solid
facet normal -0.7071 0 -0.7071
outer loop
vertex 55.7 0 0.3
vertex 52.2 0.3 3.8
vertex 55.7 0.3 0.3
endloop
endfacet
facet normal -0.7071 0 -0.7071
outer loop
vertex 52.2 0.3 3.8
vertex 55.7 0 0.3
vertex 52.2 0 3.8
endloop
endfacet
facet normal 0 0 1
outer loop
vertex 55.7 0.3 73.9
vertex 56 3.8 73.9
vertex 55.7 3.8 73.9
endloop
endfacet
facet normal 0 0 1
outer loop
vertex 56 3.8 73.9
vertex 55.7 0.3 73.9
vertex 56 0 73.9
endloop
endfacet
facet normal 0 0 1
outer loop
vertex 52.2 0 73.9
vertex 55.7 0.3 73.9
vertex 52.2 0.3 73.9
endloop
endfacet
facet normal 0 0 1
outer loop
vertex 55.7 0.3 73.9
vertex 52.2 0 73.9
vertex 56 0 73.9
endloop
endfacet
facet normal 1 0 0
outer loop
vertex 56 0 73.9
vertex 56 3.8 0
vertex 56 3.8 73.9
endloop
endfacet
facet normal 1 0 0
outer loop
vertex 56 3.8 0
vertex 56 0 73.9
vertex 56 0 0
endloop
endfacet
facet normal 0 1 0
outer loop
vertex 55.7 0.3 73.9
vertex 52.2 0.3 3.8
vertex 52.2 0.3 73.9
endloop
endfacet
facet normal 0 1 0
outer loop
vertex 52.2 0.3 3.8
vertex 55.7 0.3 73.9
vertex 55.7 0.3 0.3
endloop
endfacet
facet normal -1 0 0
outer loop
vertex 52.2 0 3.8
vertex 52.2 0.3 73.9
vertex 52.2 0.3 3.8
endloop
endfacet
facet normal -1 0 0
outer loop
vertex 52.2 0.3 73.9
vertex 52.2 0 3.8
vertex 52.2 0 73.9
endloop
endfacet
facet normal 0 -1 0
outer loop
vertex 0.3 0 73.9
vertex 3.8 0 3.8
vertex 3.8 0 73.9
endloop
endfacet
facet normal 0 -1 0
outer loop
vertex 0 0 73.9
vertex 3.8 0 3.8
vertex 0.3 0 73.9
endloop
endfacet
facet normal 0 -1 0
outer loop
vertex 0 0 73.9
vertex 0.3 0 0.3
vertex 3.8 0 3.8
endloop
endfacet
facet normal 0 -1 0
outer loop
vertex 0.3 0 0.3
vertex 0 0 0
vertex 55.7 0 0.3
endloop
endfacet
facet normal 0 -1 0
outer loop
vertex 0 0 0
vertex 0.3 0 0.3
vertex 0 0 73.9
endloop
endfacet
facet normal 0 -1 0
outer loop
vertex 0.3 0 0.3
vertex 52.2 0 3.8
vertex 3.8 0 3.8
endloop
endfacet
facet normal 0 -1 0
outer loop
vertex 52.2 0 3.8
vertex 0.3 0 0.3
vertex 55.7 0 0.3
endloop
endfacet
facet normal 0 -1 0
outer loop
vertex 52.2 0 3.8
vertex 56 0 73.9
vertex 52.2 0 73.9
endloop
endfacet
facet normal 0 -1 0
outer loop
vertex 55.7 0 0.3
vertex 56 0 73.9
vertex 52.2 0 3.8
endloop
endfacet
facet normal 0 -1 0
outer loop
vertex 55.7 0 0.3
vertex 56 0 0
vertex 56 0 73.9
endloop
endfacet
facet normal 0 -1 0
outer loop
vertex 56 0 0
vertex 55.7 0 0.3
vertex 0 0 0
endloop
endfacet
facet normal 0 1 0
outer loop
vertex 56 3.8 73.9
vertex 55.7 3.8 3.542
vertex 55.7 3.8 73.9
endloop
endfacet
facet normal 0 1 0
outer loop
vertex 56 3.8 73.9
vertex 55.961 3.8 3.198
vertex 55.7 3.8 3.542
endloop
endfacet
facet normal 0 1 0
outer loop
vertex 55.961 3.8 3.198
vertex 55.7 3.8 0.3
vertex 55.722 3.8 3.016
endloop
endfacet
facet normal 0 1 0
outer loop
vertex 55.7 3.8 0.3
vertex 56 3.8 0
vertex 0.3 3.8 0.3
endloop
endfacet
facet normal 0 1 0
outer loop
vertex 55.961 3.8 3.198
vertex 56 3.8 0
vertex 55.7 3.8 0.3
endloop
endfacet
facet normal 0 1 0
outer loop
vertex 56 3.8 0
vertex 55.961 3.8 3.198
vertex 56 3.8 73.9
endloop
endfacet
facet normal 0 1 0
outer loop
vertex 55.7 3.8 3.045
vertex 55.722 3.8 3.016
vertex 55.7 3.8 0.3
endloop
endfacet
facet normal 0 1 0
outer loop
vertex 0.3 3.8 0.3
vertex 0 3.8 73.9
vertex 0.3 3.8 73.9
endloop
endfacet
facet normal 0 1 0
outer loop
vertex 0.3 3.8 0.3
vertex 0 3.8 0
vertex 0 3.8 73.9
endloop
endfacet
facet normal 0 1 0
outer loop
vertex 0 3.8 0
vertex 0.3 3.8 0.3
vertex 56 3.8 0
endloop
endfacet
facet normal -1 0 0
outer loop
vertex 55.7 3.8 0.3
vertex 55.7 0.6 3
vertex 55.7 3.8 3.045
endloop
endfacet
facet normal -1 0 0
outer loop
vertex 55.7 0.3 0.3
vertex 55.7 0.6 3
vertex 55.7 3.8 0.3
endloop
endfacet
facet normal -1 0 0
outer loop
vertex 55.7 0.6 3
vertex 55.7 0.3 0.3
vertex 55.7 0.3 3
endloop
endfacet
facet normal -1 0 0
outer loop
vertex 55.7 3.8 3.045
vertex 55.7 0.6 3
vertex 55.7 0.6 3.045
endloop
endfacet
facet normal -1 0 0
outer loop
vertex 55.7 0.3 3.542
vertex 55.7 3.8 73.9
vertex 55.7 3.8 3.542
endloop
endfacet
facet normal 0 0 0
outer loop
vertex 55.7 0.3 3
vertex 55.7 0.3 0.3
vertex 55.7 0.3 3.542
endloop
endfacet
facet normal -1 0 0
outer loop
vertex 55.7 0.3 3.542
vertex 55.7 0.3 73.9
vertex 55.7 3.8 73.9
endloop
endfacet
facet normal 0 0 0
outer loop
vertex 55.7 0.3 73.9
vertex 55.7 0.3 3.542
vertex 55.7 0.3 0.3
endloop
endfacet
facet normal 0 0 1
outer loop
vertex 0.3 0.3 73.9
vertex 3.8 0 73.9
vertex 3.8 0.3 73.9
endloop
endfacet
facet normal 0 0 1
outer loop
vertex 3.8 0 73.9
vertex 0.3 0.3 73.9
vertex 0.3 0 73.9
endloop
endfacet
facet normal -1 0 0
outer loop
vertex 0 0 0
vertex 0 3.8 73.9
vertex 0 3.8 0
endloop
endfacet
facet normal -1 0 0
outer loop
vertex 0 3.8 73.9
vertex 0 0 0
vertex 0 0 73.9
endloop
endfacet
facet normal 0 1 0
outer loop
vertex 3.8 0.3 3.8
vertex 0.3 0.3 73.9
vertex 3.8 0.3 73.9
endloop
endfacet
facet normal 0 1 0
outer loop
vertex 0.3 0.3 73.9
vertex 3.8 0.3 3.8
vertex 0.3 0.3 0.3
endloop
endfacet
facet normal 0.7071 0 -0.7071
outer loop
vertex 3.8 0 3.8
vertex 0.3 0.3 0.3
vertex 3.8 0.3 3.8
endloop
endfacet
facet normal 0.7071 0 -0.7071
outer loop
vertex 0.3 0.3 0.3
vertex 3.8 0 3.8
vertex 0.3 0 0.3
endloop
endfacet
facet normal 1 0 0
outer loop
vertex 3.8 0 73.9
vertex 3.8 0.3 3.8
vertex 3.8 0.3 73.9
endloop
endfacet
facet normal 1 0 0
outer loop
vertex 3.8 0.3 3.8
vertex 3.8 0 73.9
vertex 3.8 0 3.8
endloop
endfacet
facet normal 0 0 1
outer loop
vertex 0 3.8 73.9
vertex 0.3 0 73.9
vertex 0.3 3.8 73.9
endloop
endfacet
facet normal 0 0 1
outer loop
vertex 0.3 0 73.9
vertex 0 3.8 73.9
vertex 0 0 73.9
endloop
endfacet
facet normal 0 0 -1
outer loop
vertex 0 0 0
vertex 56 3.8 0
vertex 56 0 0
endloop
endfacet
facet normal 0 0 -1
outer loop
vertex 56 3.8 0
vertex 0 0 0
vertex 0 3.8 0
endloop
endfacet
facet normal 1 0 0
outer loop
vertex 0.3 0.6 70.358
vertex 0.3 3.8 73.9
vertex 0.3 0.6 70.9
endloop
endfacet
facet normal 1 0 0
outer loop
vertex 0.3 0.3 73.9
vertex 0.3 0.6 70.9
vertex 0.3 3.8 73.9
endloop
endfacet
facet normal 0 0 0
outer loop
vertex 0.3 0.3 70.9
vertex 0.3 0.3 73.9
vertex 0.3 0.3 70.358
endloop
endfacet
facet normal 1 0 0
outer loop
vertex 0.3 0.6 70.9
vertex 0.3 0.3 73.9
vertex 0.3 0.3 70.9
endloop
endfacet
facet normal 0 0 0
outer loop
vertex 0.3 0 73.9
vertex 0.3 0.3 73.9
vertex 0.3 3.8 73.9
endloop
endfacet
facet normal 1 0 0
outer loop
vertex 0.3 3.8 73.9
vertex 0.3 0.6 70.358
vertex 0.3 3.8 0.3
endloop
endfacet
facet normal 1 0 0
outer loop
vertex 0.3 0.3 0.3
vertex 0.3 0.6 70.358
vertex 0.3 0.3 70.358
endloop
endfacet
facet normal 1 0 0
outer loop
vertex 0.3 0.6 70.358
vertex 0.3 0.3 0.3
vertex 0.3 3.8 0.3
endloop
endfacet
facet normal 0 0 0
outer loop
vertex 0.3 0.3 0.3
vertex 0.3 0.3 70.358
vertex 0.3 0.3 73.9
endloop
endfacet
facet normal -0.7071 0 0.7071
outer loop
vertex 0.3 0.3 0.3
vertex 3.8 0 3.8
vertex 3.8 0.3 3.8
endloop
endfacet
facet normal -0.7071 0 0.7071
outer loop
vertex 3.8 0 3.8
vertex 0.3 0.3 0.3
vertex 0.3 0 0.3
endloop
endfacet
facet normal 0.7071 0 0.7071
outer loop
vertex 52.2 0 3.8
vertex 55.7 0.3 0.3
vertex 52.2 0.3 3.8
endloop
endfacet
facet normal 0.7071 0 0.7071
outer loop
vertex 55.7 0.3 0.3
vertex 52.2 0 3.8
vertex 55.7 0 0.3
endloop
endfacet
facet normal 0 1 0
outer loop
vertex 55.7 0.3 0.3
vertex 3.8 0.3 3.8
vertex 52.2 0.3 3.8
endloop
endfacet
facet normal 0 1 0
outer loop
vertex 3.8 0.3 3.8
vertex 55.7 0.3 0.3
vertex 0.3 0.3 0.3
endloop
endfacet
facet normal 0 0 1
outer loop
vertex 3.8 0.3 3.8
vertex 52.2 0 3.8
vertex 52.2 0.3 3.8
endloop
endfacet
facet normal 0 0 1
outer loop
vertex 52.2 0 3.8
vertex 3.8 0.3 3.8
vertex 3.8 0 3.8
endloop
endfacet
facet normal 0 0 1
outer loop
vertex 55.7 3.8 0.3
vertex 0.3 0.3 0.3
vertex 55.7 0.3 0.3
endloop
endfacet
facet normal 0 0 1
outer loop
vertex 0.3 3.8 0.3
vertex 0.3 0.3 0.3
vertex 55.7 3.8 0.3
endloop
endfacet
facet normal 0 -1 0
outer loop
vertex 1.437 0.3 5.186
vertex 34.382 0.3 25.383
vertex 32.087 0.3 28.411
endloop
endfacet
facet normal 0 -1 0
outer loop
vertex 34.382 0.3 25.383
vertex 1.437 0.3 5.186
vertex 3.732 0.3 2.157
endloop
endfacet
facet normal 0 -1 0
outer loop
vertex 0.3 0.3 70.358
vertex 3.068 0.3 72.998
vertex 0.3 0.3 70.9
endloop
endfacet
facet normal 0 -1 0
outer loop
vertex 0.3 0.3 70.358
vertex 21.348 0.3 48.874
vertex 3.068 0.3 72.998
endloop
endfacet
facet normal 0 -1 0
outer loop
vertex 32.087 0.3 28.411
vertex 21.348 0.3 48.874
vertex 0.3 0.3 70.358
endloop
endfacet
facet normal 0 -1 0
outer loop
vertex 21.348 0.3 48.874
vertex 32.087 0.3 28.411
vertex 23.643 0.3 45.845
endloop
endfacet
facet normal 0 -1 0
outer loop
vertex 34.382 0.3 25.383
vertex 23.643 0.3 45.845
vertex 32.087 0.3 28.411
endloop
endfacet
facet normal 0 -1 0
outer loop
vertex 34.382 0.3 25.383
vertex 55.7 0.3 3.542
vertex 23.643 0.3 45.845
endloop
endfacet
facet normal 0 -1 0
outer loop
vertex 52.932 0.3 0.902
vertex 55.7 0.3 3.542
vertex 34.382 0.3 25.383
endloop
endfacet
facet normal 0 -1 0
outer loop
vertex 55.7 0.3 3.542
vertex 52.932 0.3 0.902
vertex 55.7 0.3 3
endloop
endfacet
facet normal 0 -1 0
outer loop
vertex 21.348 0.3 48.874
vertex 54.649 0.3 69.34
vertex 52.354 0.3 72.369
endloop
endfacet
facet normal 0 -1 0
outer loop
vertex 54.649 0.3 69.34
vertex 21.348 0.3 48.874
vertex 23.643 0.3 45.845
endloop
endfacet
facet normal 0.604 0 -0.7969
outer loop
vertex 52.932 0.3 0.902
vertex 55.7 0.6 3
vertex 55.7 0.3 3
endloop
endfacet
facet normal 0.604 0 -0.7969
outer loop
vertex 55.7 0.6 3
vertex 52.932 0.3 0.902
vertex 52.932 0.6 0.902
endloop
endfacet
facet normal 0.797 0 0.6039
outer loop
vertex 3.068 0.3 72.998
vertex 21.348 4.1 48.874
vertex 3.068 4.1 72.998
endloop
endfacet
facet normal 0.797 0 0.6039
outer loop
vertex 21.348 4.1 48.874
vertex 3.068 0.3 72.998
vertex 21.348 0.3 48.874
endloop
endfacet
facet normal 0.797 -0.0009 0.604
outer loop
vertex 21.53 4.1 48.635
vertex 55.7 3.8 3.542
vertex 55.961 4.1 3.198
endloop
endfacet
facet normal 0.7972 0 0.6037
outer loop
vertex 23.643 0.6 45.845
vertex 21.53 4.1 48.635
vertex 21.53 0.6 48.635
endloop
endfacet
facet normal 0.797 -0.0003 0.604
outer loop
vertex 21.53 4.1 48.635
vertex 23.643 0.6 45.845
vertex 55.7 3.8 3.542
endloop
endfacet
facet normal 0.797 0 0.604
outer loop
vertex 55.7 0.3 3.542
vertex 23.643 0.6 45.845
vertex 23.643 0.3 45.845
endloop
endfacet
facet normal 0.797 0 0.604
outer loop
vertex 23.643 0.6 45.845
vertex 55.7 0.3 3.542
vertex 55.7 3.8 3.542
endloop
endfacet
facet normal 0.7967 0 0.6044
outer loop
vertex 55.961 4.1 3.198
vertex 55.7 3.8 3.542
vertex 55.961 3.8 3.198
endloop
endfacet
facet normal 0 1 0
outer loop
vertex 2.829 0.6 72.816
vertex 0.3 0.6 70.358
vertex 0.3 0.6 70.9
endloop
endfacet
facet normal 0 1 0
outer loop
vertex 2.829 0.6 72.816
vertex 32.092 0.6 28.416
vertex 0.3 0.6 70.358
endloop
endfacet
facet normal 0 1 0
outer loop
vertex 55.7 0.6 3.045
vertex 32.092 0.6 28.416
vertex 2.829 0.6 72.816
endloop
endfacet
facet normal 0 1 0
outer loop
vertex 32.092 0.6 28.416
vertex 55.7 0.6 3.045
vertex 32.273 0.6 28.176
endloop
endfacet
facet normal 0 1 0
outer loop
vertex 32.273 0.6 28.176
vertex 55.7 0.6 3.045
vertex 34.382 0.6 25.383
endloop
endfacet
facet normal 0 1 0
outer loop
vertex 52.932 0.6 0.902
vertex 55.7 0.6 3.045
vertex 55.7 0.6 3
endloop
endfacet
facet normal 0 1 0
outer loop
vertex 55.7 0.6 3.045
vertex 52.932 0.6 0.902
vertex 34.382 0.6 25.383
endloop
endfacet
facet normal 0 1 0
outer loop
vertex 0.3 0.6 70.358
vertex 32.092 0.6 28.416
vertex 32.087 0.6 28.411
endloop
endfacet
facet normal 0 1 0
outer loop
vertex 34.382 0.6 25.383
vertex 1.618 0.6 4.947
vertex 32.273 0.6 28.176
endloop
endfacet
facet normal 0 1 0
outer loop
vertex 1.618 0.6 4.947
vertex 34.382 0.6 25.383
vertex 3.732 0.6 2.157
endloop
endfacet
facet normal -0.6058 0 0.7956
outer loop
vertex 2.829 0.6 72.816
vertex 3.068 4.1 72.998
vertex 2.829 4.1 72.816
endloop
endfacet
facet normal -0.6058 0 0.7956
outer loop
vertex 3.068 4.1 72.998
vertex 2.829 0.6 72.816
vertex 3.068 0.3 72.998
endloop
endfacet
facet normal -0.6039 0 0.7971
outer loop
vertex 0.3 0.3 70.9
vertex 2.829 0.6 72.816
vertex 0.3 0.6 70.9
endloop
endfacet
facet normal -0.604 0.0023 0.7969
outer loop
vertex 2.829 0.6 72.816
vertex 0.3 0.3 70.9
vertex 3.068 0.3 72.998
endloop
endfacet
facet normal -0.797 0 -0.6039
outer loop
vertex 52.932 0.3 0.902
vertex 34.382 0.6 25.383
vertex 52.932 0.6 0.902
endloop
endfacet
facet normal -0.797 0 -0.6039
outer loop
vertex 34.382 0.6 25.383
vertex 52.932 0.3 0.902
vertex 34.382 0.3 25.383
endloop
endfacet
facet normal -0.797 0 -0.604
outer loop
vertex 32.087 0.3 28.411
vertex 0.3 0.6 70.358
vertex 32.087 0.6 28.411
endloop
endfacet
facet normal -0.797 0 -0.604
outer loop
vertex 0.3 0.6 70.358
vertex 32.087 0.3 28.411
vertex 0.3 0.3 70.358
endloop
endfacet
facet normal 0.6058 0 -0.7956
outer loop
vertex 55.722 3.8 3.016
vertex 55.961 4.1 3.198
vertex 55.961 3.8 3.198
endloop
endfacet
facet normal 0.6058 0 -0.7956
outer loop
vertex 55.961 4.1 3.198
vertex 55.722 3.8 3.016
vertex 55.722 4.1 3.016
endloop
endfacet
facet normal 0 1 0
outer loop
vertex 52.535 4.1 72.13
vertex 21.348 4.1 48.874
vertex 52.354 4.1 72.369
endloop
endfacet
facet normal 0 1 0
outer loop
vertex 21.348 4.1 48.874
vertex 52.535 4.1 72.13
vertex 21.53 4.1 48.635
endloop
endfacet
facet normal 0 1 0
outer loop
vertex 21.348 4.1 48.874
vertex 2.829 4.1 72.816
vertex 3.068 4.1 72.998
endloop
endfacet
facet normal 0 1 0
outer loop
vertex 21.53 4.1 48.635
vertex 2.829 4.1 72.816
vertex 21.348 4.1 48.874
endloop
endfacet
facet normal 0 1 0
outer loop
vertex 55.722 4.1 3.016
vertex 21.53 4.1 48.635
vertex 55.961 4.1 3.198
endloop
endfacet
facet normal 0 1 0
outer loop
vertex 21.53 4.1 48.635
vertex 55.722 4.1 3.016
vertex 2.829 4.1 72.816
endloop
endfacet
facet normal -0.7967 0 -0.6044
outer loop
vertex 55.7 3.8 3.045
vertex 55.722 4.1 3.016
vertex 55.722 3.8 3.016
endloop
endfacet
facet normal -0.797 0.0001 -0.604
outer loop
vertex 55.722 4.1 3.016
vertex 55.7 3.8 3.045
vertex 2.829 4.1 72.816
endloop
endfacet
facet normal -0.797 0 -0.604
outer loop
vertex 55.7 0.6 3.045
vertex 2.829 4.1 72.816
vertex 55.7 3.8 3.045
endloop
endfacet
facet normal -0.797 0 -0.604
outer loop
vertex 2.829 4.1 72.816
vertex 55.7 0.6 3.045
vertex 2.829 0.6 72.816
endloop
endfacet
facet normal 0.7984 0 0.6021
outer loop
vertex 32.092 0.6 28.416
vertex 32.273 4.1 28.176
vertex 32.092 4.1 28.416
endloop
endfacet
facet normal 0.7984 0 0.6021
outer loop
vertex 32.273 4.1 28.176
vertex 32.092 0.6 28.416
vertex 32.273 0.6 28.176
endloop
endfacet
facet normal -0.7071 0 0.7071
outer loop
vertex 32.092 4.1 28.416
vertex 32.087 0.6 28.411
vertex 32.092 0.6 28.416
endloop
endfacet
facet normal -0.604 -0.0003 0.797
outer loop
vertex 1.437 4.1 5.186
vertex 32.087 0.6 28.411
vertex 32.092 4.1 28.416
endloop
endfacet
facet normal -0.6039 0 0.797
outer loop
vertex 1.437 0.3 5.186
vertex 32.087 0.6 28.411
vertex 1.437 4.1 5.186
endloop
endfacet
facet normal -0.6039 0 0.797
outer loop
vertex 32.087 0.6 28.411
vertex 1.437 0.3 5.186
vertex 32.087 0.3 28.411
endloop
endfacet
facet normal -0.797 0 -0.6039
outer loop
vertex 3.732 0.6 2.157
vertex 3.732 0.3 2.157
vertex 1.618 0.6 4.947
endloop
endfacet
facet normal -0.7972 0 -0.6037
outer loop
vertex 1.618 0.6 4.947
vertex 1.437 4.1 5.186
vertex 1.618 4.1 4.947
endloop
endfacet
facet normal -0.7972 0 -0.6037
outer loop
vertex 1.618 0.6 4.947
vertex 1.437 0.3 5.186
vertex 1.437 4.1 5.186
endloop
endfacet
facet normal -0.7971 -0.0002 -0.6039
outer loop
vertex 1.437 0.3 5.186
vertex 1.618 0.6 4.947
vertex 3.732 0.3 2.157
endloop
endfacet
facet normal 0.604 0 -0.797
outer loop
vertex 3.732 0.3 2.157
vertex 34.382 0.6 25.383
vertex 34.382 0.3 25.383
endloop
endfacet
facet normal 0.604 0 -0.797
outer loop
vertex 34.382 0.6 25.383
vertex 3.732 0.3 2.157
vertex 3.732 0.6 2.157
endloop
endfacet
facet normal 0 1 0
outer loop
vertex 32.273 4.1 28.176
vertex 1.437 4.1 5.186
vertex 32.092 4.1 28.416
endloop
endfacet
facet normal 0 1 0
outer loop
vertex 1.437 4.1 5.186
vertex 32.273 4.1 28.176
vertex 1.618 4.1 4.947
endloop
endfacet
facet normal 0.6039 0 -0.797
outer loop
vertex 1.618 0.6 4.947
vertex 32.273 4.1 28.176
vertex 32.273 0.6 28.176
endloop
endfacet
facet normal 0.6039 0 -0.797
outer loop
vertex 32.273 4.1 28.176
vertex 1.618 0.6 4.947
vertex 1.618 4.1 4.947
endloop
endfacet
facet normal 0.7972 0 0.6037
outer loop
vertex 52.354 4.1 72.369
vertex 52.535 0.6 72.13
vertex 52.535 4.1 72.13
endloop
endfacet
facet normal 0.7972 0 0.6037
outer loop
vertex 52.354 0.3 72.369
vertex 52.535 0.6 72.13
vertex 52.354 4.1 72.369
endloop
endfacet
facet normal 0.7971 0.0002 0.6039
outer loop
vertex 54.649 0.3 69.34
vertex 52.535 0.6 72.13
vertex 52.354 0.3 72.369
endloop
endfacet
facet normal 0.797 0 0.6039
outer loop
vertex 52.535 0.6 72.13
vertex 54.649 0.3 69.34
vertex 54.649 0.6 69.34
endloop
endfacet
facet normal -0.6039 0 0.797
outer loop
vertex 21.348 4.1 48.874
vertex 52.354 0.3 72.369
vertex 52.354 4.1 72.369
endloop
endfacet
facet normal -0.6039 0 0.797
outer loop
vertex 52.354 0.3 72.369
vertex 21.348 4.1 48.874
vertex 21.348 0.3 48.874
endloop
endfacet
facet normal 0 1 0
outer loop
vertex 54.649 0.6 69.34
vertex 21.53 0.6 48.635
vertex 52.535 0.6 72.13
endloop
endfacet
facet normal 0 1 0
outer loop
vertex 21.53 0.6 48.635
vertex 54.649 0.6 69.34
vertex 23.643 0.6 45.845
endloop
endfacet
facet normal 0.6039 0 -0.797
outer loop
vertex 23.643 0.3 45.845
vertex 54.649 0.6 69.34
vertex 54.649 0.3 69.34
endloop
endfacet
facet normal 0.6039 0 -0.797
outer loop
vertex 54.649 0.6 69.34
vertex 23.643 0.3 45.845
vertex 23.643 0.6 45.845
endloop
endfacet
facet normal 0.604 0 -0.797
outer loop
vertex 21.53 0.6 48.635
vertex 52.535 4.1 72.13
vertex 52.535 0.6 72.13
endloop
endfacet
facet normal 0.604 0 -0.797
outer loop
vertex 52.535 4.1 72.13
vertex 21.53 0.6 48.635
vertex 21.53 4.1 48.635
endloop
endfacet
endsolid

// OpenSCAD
// use <hdim.scad> 


bar_t  = 0.3;

module tableleg(height = 73.9, width = 56, bar_diam = 3.8, dimensions=true, explode=false)
{
    d = explode ? 20 : 0;
    c1 = [0.5,0.28,0.19, 1.0];
    c2 = [0.8,0.30,0.29, 1.0];
    
    translate([width,0,0])
    rotate([0,90,90])
    {
    translate([-height,-d,0]) 
    tl_anglebar(height, bar_diam, c1, straight1=true);
    translate([0,width+d,0]) 
    rotate([0,0,180])
    tl_anglebar(height, bar_diam, c1, straight2=true);
    translate([d,0,0]) 
    rotate([0,0,90])
    tl_anglebar(width, bar_diam, c2);
    angle = atan2(width, height);
    len = sqrt(width*width+height*height) - (bar_diam+bar_t)/cos(angle);
    translate([-height/2,width/2,bar_t]) 
    rotate([0,0,-angle])
    translate([-len/2,-bar_diam/2,0]) 
    tl_anglebar(len, bar_diam, c2, straight1=true, straight2=true);

    
    hyp = width - 1.41*bar_diam;
    angle2 = -angle+90;
    cat1 = sin(angle)*hyp;
    cat2 = cos(angle)*hyp;
    len2 = cat2 - bar_diam/2;
    
    dx = cat1*cos(angle);
    dy = cat1*sin(angle)+1.25*bar_diam/2;
    translate([-dx,dy,bar_t]) 
    rotate([0,0, angle2])
    translate([len2,4*bar_diam/3,0]) 
    rotate([0,0,180])
    tl_anglebar(len2, bar_diam, c2, straight1=true, straight2=true);

    dx2 = height-dx-bar_diam/2-bar_t;
    dy2 = width-dy-bar_diam/2+bar_t;
    translate([-dx2,dy2,bar_t]) 
    rotate([0,0, angle2])
    translate([0,bar_diam/2,0]) 
     rotate([0,0,180])
    tl_anglebar(len2+0.5,bar_diam, c2,straight1=true, straight2=true);
    }
}        

module tl_anglebar(height, bar_diam, c, straight1=false, straight2=false)
{
   color(c)
    {
        linear_extrude(bar_t) 
        polygon(points=[[0,0],
            [straight1?0:bar_diam, bar_diam],
            [straight2?height:height-bar_diam, bar_diam],
            [height, 0], [0,0]]);
 
        cube([height, bar_t, bar_diam]);
    }
}   


tableleg();
